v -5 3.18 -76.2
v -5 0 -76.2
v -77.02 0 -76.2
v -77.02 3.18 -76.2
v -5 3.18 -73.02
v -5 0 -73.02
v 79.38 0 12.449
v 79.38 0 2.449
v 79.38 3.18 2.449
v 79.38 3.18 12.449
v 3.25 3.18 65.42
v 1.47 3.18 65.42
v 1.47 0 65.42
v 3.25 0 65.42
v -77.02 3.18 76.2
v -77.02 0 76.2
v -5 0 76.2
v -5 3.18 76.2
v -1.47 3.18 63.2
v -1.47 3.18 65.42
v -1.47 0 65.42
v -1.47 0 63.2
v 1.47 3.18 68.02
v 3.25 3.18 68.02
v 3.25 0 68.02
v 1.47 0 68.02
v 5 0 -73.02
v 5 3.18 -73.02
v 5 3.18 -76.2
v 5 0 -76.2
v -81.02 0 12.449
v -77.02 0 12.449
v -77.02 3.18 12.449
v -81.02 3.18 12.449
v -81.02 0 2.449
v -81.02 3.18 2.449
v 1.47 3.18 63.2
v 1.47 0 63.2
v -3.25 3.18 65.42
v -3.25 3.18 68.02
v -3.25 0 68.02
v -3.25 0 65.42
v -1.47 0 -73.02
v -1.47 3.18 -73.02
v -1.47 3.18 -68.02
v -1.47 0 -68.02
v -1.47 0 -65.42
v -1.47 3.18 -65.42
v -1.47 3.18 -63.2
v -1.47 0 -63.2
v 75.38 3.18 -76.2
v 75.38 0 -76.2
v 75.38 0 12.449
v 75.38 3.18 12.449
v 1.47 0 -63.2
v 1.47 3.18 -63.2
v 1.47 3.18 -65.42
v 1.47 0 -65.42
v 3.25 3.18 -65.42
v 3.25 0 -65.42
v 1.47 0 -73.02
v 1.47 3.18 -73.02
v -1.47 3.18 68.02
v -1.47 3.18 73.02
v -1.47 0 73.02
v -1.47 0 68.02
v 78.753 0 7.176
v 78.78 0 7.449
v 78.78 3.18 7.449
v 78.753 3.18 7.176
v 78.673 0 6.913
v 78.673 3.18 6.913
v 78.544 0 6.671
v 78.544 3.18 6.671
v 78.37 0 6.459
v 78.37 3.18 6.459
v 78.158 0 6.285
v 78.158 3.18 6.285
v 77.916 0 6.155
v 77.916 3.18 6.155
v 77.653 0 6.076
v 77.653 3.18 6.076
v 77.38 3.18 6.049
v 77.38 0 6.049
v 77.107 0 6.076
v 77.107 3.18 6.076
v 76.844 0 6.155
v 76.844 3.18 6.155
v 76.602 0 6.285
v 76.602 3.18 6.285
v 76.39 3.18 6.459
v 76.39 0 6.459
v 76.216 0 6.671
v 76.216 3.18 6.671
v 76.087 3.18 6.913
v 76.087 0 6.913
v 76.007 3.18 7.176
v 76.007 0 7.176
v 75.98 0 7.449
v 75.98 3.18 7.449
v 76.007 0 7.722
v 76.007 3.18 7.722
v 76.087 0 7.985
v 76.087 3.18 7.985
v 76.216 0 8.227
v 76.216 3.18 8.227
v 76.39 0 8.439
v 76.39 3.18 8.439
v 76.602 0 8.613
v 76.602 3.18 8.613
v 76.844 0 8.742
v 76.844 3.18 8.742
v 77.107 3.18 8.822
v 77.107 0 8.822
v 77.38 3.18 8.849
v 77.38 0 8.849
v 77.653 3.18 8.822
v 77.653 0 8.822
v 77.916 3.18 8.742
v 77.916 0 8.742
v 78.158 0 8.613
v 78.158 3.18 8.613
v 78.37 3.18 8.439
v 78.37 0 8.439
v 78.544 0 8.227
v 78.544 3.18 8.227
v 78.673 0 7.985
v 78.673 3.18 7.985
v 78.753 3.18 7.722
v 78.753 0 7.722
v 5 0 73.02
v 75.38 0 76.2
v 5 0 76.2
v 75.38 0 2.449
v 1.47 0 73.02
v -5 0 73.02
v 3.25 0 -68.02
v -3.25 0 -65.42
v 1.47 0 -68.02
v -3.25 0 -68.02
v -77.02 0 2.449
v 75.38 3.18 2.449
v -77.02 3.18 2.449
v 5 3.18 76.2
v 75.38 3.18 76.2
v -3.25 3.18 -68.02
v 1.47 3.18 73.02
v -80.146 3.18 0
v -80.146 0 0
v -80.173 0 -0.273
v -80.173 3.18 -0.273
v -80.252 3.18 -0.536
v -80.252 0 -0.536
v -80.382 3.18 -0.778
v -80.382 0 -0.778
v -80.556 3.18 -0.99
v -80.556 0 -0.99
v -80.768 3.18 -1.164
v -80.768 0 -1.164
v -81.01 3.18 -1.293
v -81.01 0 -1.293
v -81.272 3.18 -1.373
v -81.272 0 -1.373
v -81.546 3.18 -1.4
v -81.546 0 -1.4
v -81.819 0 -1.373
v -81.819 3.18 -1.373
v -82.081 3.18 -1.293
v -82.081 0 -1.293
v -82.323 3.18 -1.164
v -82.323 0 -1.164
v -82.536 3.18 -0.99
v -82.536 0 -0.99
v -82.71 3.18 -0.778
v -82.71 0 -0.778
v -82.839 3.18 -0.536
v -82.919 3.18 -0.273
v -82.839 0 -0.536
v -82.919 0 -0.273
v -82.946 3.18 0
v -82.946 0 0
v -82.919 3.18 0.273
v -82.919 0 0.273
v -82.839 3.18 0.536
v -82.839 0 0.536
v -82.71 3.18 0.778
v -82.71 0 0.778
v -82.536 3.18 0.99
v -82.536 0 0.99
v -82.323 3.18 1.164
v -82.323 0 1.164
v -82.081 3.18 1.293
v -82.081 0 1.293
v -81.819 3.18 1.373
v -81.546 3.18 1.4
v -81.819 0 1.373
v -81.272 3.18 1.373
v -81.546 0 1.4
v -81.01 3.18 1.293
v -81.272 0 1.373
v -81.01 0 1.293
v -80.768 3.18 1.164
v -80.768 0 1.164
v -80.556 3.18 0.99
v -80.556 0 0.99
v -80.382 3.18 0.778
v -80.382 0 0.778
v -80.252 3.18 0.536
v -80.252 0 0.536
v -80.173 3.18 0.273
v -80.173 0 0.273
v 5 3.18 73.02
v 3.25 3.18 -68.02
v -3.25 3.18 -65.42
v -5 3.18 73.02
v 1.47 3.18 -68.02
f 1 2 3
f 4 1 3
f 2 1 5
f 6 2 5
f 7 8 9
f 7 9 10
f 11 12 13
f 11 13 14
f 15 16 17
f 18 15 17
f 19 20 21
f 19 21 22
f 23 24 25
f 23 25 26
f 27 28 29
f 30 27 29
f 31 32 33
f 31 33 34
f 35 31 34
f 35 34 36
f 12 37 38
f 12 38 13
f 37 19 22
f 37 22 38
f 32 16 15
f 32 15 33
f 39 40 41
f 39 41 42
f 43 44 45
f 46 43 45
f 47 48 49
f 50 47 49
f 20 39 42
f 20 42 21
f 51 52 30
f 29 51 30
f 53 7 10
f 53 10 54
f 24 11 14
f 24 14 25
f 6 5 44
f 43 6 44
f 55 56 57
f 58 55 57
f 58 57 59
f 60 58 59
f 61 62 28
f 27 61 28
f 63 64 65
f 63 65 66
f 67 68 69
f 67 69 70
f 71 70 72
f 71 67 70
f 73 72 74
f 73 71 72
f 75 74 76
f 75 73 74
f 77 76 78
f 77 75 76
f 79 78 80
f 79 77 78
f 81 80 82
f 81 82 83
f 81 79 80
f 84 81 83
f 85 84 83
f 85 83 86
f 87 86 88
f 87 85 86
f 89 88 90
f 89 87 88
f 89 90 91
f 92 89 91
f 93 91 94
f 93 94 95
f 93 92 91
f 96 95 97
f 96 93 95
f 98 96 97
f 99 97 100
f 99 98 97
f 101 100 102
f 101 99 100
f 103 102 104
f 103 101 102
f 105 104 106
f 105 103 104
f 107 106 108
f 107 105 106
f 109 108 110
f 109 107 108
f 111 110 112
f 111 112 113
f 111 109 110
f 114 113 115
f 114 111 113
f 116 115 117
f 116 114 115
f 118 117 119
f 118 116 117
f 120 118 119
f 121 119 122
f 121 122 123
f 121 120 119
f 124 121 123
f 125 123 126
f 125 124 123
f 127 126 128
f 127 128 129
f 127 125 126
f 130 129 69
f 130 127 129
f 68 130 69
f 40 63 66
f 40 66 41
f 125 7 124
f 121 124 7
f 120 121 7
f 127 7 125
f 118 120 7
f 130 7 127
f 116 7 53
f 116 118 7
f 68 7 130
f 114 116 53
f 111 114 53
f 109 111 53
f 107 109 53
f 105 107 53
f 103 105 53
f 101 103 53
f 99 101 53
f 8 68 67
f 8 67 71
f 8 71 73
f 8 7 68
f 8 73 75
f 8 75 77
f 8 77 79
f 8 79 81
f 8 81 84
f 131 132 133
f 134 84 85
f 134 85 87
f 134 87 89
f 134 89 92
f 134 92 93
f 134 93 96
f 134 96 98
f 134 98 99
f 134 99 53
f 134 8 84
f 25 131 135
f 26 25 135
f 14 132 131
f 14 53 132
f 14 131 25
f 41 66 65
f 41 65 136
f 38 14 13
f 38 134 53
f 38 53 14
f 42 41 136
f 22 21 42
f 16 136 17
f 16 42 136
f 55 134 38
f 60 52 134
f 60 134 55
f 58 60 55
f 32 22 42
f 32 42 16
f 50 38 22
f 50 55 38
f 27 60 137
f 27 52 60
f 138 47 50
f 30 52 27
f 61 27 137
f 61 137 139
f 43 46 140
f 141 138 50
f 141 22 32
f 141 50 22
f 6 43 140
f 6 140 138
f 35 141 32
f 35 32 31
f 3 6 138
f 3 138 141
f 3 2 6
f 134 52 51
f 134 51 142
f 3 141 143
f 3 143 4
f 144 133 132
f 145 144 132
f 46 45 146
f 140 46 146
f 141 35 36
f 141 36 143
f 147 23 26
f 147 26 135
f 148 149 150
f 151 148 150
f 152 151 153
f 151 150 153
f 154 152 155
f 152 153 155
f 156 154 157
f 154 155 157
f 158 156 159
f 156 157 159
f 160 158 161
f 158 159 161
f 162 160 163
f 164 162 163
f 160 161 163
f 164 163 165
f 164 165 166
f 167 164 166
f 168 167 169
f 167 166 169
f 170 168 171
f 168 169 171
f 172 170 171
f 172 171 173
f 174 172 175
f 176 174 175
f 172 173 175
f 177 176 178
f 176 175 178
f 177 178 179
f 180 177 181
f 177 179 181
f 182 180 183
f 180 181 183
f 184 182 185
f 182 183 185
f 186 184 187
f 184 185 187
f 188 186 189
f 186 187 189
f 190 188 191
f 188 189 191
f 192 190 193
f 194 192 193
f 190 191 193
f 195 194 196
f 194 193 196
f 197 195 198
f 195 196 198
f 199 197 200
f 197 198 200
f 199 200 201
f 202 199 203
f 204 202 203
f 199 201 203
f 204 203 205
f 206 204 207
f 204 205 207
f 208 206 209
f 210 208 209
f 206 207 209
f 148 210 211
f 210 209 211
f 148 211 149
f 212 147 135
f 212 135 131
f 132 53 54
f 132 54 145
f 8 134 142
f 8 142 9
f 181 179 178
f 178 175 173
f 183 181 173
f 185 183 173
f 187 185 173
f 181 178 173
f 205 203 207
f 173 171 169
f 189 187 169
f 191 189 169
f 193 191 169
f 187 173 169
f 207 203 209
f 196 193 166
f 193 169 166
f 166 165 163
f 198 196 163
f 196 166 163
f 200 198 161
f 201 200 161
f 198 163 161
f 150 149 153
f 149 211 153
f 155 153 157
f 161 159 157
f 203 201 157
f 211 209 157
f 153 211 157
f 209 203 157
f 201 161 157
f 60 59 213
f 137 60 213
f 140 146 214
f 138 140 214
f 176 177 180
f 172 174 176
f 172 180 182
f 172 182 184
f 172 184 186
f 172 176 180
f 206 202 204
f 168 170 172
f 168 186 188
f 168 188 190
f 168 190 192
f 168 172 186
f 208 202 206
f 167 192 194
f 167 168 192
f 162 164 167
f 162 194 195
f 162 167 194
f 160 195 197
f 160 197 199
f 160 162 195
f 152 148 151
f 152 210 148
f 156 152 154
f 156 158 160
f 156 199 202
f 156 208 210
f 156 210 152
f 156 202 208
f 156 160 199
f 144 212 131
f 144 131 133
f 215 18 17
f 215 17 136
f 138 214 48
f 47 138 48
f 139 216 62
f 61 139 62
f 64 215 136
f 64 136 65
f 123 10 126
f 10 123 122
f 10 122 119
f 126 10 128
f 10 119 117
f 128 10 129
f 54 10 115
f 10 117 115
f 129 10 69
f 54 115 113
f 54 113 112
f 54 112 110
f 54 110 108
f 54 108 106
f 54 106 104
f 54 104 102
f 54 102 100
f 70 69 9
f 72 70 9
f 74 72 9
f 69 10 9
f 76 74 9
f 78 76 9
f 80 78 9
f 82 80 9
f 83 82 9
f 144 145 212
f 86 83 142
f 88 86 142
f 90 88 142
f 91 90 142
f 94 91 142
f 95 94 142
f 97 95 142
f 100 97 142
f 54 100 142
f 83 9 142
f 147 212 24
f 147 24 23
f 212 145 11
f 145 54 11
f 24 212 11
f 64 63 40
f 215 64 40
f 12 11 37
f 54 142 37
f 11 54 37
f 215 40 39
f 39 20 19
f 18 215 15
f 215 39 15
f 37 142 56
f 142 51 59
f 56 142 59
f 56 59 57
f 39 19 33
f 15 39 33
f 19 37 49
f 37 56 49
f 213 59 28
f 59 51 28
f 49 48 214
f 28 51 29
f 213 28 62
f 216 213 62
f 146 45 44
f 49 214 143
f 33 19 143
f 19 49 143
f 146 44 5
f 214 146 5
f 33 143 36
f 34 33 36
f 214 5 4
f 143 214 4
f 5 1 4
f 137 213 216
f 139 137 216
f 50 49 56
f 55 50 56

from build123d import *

# Parameters (mm, degrees)
SKETCH1_R             = 1.4
BOSS_EXTRUDE1_DEPTH   = 3.18
BOSS_EXTRUDE1_2_DEPTH = 3.18
CUT_EXTRUDE1_DEPTH    = 3.18


with BuildPart() as part:
    # Sketch1 → Boss-Extrude1 (new body)
    with BuildSketch(Plane(origin=(0, 0, 0), x_dir=(1, 0, 0), z_dir=(0, 1, 0))):
        with Locations((-81.54562107, 0)):
            Circle(SKETCH1_R)
    extrude(amount=BOSS_EXTRUDE1_DEPTH)


with BuildPart() as body_2:
    # Sketch1 → Boss-Extrude1 2 (new body)
    with BuildSketch(Plane(origin=(0, 0, 0), x_dir=(1, 0, 0), z_dir=(0, 1, 0))):
        Polygon((-77.02, 76.2), (-5.292081761, 76.2), (3.652081761, 76.2), (75.38, 76.2), (75.38, -2.448884984), (79.38, -2.448884984), (79.38, -12.448884984), (75.38, -12.448884984), (75.38, -76.2), (3.652081761, -76.2), (-5.292081761, -76.2), (-77.02, -76.2), (-77.02, -12.448884984), (-81.02, -12.448884984), (-81.02, -2.448884984), (-77.02, -2.448884984), align=None)
        with Locations((77.38, -7.448884984)):
            Circle(SKETCH1_R, mode=Mode.SUBTRACT)
    extrude(amount=BOSS_EXTRUDE1_2_DEPTH)

    # Sketch2 → Cut-Extrude1 (cut)
    with BuildSketch(Plane(origin=(0, 3.18, 0), x_dir=(1, 0, 0), z_dir=(0, 1, 0))):
        Polygon((5, 76.2), (-5, 76.2), (-5, 73.02), (-1.47, 73.02), (-1.47, 68.02), (-3.25, 68.02), (-3.25, 65.42), (-1.47, 65.42), (-1.47, 63.2), (1.47, 63.2), (1.47, 65.42), (3.25, 65.42), (3.25, 68.02), (1.47, 68.02), (1.47, 73.02), (5, 73.02), align=None)
    cut_extrude1 = extrude(amount=-CUT_EXTRUDE1_DEPTH, mode=Mode.SUBTRACT)

    # Mirror4: Cut-Extrude1 across plane
    add(cut_extrude1.mirror(Plane.XY), mode=Mode.SUBTRACT)


solid = Compound([part.part, body_2.part])
